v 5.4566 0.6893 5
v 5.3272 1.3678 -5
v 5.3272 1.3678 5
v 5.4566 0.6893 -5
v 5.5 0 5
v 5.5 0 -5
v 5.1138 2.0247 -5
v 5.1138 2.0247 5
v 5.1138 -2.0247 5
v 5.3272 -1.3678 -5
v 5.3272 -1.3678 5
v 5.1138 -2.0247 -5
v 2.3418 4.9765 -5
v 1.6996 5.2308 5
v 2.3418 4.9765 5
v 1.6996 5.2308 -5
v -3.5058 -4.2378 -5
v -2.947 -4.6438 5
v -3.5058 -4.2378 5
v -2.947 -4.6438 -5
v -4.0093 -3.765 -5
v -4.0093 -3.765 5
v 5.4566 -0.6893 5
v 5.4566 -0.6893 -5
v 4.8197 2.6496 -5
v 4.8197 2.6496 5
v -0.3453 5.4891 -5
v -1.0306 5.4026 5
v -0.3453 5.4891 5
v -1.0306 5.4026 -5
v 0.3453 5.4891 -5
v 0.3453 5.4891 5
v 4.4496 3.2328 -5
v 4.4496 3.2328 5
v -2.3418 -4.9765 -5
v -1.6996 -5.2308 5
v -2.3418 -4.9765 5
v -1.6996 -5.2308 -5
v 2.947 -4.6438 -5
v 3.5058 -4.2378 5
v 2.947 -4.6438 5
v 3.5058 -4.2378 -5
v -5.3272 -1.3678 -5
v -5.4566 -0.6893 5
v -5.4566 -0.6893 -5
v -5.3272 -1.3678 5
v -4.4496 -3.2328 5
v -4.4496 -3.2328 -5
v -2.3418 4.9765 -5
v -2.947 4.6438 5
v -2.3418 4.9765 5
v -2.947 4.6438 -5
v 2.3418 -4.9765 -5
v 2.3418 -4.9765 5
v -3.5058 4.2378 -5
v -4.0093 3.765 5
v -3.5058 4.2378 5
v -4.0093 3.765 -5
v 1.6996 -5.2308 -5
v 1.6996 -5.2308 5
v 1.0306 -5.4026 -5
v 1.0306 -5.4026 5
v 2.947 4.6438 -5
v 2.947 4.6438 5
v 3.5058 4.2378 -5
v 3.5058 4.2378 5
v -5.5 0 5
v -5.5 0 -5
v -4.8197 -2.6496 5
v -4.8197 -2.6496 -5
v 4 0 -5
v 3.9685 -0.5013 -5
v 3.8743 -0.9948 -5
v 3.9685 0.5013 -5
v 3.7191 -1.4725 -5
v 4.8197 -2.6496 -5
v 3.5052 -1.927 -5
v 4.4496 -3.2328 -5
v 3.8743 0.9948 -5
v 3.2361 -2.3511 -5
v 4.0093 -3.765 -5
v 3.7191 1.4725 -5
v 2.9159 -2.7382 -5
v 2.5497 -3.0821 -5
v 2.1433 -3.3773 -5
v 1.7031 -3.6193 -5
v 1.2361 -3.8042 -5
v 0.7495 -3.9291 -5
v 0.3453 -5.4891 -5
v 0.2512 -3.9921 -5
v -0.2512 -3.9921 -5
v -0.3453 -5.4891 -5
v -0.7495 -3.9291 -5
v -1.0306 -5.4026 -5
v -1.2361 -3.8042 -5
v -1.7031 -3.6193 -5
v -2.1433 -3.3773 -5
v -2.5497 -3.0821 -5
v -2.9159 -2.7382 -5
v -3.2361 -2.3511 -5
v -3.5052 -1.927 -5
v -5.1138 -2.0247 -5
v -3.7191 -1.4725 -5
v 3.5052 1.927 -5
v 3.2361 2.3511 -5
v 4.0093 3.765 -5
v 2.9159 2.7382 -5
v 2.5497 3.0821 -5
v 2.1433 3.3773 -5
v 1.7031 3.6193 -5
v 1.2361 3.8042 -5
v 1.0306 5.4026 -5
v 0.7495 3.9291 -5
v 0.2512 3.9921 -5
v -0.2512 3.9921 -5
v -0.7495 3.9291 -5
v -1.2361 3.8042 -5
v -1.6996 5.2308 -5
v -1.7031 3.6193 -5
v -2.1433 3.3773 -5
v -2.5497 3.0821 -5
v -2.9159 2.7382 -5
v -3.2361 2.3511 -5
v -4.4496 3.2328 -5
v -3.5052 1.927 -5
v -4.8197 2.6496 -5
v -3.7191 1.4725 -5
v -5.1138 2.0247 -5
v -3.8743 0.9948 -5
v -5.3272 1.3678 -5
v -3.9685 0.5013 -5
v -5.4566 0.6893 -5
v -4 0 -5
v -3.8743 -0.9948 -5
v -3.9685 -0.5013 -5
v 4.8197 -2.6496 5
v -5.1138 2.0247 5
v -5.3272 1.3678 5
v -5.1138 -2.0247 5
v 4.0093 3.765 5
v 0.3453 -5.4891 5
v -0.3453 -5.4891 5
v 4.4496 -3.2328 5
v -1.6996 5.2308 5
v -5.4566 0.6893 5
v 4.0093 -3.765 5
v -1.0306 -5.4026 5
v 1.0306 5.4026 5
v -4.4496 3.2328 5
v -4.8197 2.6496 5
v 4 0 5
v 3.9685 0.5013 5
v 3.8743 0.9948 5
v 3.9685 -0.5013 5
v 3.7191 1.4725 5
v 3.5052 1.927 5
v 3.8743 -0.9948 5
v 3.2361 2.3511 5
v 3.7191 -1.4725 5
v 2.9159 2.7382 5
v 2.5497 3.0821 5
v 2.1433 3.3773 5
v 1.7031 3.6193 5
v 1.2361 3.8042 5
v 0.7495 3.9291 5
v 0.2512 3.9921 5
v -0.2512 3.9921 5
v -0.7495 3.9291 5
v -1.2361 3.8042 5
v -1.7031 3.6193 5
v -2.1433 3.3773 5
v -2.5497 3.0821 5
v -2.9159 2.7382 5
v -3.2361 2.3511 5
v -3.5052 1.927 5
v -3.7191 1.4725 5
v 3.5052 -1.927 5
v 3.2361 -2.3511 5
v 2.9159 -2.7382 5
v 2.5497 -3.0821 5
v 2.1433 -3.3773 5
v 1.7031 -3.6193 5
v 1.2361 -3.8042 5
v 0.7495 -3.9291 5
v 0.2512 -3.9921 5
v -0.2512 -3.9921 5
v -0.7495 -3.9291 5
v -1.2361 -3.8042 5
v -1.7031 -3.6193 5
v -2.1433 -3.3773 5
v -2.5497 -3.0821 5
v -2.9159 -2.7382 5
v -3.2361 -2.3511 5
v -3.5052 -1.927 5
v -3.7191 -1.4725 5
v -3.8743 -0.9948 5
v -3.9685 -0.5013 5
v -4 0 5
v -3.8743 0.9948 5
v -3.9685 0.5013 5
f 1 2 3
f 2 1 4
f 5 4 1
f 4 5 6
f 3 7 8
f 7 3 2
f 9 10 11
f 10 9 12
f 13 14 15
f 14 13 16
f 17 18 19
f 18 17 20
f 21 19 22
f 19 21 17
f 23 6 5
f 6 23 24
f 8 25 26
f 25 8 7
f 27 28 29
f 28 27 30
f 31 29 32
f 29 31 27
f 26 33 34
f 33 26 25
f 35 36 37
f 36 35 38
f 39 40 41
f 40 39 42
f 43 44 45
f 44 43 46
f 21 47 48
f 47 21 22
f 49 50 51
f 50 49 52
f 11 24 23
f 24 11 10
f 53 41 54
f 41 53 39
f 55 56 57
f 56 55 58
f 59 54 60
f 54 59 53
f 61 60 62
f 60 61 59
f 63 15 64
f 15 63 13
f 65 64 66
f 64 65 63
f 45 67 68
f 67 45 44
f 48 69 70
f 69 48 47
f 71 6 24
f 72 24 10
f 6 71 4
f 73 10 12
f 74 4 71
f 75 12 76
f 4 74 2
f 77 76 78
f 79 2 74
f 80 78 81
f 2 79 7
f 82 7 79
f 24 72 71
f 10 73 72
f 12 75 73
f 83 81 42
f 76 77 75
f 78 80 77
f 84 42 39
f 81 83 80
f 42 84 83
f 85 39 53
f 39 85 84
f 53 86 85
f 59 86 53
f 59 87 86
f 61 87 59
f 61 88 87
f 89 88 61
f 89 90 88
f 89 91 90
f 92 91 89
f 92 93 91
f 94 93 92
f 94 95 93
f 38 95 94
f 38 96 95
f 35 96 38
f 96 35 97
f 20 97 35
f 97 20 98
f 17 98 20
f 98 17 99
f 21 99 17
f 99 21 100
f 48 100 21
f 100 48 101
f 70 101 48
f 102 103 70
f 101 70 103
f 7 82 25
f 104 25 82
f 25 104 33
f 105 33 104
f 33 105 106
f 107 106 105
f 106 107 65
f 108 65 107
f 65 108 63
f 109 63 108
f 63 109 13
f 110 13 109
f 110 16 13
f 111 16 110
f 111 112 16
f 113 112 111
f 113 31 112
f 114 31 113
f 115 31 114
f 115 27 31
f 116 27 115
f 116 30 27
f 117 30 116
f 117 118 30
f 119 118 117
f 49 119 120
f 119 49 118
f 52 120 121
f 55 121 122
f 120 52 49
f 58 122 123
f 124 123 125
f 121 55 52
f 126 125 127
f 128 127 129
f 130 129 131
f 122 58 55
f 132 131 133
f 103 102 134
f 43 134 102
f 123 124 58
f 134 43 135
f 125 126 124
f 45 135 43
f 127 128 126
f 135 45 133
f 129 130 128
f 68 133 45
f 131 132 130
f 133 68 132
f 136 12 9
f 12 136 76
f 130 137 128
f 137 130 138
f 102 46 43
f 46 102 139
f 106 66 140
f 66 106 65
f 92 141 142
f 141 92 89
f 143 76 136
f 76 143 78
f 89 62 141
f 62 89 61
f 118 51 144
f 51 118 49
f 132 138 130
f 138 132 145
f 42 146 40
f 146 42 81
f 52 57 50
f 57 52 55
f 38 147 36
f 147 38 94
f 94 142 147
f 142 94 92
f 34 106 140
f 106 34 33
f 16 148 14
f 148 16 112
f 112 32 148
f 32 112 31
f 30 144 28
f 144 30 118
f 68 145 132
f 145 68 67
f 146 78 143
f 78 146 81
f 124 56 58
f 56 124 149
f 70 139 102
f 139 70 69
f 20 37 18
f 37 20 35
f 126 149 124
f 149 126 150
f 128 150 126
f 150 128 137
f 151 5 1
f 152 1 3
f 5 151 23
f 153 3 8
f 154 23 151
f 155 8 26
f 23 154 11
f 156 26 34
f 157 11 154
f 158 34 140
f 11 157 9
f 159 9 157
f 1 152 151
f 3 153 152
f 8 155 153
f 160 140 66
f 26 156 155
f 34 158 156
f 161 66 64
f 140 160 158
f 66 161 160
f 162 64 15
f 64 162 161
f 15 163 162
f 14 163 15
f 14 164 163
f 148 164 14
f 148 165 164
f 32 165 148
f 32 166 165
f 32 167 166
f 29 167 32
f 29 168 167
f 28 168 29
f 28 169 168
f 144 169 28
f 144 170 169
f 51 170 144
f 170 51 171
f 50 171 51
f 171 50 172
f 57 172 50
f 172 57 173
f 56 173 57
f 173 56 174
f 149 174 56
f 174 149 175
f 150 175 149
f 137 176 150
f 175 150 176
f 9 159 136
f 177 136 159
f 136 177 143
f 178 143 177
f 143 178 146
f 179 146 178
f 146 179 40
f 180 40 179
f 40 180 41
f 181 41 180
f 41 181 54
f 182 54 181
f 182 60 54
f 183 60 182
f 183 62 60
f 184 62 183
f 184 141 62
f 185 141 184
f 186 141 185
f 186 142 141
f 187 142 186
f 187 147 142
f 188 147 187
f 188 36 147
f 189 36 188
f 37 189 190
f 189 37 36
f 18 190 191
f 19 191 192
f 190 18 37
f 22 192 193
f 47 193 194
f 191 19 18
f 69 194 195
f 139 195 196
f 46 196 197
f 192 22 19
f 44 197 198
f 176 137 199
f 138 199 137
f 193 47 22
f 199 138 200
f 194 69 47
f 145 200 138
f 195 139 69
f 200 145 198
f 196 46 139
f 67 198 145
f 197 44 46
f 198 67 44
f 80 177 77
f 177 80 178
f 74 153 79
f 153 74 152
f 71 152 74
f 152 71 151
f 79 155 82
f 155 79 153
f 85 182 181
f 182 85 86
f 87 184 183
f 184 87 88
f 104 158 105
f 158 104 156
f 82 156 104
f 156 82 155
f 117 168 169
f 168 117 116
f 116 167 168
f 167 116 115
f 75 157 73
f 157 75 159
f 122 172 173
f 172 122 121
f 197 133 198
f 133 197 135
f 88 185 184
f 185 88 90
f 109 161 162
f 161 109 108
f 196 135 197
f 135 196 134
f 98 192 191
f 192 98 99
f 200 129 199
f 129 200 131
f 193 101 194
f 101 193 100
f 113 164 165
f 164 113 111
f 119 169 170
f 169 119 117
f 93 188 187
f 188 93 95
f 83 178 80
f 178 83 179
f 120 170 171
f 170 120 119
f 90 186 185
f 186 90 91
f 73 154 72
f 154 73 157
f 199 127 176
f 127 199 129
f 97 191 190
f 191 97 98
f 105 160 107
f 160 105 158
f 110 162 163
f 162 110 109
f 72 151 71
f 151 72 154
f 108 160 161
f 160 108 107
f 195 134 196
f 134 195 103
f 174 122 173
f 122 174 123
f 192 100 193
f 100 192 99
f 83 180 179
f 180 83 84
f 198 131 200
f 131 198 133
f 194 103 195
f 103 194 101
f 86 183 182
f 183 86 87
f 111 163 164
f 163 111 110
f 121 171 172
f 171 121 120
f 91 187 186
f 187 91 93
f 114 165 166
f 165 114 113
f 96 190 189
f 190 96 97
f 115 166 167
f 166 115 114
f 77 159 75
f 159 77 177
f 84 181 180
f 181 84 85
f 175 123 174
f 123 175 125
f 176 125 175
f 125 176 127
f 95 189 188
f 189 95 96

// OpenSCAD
$fn = 50;


difference() {
	union() {
		translate(v = [0, 0, -5.0000000000]) {
			cylinder(h = 10, r = 5.5000000000);
		}
	}
	union() {
		translate(v = [0, 0, -100.0000000000]) {
			cylinder(h = 200, r = 4.0000000000);
		}
	}
}
